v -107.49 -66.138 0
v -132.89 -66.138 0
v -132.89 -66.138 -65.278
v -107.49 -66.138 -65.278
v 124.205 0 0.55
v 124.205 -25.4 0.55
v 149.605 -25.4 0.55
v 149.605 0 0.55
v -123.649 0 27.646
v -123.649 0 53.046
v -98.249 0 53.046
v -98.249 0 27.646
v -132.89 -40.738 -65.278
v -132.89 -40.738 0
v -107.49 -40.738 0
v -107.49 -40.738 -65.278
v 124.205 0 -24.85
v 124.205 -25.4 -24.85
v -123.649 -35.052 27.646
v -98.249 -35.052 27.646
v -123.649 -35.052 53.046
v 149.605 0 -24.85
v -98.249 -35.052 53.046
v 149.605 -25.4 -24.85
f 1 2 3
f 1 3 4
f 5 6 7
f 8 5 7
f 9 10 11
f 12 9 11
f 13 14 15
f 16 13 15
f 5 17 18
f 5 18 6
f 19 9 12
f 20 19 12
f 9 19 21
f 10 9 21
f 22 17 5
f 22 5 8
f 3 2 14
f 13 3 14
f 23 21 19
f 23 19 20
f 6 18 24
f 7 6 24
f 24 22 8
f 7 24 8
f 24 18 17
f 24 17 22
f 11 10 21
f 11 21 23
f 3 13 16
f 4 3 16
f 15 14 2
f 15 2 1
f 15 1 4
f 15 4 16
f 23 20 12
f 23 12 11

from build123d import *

# Parameters (mm, degrees)
F0_W     = 25.4
F0_H     = 25.4
F1_DEPTH = 35.052
F2_W     = 25.4
F2_H     = 25.4
F3_DEPTH = 65.278
F4_W     = 25.4
F4_H     = 25.4
F5_DEPTH = 25.4


with BuildPart() as f1:
    # F0 (on Front) → F1 (new body)
    with BuildSketch(Plane.XZ):
        with Locations((-110.948767, 40.346026)):
            Rectangle(F0_W, F0_H)
    extrude(amount=F1_DEPTH)


with BuildPart() as f3:
    # F2 (on Top) → F3 (new body)
    with BuildSketch(Plane.XY):
        with Locations((-120.190416, -53.437876)):
            Rectangle(F2_W, F2_H)
    extrude(amount=-F3_DEPTH)


with BuildPart() as f5:
    # F4 (on Front) → F5 (new body)
    with BuildSketch(Plane.XZ):
        with Locations((136.904676, -12.149947)):
            Rectangle(F4_W, F4_H)
    extrude(amount=F5_DEPTH)


solid = Compound([f1.part, f3.part, f5.part])
